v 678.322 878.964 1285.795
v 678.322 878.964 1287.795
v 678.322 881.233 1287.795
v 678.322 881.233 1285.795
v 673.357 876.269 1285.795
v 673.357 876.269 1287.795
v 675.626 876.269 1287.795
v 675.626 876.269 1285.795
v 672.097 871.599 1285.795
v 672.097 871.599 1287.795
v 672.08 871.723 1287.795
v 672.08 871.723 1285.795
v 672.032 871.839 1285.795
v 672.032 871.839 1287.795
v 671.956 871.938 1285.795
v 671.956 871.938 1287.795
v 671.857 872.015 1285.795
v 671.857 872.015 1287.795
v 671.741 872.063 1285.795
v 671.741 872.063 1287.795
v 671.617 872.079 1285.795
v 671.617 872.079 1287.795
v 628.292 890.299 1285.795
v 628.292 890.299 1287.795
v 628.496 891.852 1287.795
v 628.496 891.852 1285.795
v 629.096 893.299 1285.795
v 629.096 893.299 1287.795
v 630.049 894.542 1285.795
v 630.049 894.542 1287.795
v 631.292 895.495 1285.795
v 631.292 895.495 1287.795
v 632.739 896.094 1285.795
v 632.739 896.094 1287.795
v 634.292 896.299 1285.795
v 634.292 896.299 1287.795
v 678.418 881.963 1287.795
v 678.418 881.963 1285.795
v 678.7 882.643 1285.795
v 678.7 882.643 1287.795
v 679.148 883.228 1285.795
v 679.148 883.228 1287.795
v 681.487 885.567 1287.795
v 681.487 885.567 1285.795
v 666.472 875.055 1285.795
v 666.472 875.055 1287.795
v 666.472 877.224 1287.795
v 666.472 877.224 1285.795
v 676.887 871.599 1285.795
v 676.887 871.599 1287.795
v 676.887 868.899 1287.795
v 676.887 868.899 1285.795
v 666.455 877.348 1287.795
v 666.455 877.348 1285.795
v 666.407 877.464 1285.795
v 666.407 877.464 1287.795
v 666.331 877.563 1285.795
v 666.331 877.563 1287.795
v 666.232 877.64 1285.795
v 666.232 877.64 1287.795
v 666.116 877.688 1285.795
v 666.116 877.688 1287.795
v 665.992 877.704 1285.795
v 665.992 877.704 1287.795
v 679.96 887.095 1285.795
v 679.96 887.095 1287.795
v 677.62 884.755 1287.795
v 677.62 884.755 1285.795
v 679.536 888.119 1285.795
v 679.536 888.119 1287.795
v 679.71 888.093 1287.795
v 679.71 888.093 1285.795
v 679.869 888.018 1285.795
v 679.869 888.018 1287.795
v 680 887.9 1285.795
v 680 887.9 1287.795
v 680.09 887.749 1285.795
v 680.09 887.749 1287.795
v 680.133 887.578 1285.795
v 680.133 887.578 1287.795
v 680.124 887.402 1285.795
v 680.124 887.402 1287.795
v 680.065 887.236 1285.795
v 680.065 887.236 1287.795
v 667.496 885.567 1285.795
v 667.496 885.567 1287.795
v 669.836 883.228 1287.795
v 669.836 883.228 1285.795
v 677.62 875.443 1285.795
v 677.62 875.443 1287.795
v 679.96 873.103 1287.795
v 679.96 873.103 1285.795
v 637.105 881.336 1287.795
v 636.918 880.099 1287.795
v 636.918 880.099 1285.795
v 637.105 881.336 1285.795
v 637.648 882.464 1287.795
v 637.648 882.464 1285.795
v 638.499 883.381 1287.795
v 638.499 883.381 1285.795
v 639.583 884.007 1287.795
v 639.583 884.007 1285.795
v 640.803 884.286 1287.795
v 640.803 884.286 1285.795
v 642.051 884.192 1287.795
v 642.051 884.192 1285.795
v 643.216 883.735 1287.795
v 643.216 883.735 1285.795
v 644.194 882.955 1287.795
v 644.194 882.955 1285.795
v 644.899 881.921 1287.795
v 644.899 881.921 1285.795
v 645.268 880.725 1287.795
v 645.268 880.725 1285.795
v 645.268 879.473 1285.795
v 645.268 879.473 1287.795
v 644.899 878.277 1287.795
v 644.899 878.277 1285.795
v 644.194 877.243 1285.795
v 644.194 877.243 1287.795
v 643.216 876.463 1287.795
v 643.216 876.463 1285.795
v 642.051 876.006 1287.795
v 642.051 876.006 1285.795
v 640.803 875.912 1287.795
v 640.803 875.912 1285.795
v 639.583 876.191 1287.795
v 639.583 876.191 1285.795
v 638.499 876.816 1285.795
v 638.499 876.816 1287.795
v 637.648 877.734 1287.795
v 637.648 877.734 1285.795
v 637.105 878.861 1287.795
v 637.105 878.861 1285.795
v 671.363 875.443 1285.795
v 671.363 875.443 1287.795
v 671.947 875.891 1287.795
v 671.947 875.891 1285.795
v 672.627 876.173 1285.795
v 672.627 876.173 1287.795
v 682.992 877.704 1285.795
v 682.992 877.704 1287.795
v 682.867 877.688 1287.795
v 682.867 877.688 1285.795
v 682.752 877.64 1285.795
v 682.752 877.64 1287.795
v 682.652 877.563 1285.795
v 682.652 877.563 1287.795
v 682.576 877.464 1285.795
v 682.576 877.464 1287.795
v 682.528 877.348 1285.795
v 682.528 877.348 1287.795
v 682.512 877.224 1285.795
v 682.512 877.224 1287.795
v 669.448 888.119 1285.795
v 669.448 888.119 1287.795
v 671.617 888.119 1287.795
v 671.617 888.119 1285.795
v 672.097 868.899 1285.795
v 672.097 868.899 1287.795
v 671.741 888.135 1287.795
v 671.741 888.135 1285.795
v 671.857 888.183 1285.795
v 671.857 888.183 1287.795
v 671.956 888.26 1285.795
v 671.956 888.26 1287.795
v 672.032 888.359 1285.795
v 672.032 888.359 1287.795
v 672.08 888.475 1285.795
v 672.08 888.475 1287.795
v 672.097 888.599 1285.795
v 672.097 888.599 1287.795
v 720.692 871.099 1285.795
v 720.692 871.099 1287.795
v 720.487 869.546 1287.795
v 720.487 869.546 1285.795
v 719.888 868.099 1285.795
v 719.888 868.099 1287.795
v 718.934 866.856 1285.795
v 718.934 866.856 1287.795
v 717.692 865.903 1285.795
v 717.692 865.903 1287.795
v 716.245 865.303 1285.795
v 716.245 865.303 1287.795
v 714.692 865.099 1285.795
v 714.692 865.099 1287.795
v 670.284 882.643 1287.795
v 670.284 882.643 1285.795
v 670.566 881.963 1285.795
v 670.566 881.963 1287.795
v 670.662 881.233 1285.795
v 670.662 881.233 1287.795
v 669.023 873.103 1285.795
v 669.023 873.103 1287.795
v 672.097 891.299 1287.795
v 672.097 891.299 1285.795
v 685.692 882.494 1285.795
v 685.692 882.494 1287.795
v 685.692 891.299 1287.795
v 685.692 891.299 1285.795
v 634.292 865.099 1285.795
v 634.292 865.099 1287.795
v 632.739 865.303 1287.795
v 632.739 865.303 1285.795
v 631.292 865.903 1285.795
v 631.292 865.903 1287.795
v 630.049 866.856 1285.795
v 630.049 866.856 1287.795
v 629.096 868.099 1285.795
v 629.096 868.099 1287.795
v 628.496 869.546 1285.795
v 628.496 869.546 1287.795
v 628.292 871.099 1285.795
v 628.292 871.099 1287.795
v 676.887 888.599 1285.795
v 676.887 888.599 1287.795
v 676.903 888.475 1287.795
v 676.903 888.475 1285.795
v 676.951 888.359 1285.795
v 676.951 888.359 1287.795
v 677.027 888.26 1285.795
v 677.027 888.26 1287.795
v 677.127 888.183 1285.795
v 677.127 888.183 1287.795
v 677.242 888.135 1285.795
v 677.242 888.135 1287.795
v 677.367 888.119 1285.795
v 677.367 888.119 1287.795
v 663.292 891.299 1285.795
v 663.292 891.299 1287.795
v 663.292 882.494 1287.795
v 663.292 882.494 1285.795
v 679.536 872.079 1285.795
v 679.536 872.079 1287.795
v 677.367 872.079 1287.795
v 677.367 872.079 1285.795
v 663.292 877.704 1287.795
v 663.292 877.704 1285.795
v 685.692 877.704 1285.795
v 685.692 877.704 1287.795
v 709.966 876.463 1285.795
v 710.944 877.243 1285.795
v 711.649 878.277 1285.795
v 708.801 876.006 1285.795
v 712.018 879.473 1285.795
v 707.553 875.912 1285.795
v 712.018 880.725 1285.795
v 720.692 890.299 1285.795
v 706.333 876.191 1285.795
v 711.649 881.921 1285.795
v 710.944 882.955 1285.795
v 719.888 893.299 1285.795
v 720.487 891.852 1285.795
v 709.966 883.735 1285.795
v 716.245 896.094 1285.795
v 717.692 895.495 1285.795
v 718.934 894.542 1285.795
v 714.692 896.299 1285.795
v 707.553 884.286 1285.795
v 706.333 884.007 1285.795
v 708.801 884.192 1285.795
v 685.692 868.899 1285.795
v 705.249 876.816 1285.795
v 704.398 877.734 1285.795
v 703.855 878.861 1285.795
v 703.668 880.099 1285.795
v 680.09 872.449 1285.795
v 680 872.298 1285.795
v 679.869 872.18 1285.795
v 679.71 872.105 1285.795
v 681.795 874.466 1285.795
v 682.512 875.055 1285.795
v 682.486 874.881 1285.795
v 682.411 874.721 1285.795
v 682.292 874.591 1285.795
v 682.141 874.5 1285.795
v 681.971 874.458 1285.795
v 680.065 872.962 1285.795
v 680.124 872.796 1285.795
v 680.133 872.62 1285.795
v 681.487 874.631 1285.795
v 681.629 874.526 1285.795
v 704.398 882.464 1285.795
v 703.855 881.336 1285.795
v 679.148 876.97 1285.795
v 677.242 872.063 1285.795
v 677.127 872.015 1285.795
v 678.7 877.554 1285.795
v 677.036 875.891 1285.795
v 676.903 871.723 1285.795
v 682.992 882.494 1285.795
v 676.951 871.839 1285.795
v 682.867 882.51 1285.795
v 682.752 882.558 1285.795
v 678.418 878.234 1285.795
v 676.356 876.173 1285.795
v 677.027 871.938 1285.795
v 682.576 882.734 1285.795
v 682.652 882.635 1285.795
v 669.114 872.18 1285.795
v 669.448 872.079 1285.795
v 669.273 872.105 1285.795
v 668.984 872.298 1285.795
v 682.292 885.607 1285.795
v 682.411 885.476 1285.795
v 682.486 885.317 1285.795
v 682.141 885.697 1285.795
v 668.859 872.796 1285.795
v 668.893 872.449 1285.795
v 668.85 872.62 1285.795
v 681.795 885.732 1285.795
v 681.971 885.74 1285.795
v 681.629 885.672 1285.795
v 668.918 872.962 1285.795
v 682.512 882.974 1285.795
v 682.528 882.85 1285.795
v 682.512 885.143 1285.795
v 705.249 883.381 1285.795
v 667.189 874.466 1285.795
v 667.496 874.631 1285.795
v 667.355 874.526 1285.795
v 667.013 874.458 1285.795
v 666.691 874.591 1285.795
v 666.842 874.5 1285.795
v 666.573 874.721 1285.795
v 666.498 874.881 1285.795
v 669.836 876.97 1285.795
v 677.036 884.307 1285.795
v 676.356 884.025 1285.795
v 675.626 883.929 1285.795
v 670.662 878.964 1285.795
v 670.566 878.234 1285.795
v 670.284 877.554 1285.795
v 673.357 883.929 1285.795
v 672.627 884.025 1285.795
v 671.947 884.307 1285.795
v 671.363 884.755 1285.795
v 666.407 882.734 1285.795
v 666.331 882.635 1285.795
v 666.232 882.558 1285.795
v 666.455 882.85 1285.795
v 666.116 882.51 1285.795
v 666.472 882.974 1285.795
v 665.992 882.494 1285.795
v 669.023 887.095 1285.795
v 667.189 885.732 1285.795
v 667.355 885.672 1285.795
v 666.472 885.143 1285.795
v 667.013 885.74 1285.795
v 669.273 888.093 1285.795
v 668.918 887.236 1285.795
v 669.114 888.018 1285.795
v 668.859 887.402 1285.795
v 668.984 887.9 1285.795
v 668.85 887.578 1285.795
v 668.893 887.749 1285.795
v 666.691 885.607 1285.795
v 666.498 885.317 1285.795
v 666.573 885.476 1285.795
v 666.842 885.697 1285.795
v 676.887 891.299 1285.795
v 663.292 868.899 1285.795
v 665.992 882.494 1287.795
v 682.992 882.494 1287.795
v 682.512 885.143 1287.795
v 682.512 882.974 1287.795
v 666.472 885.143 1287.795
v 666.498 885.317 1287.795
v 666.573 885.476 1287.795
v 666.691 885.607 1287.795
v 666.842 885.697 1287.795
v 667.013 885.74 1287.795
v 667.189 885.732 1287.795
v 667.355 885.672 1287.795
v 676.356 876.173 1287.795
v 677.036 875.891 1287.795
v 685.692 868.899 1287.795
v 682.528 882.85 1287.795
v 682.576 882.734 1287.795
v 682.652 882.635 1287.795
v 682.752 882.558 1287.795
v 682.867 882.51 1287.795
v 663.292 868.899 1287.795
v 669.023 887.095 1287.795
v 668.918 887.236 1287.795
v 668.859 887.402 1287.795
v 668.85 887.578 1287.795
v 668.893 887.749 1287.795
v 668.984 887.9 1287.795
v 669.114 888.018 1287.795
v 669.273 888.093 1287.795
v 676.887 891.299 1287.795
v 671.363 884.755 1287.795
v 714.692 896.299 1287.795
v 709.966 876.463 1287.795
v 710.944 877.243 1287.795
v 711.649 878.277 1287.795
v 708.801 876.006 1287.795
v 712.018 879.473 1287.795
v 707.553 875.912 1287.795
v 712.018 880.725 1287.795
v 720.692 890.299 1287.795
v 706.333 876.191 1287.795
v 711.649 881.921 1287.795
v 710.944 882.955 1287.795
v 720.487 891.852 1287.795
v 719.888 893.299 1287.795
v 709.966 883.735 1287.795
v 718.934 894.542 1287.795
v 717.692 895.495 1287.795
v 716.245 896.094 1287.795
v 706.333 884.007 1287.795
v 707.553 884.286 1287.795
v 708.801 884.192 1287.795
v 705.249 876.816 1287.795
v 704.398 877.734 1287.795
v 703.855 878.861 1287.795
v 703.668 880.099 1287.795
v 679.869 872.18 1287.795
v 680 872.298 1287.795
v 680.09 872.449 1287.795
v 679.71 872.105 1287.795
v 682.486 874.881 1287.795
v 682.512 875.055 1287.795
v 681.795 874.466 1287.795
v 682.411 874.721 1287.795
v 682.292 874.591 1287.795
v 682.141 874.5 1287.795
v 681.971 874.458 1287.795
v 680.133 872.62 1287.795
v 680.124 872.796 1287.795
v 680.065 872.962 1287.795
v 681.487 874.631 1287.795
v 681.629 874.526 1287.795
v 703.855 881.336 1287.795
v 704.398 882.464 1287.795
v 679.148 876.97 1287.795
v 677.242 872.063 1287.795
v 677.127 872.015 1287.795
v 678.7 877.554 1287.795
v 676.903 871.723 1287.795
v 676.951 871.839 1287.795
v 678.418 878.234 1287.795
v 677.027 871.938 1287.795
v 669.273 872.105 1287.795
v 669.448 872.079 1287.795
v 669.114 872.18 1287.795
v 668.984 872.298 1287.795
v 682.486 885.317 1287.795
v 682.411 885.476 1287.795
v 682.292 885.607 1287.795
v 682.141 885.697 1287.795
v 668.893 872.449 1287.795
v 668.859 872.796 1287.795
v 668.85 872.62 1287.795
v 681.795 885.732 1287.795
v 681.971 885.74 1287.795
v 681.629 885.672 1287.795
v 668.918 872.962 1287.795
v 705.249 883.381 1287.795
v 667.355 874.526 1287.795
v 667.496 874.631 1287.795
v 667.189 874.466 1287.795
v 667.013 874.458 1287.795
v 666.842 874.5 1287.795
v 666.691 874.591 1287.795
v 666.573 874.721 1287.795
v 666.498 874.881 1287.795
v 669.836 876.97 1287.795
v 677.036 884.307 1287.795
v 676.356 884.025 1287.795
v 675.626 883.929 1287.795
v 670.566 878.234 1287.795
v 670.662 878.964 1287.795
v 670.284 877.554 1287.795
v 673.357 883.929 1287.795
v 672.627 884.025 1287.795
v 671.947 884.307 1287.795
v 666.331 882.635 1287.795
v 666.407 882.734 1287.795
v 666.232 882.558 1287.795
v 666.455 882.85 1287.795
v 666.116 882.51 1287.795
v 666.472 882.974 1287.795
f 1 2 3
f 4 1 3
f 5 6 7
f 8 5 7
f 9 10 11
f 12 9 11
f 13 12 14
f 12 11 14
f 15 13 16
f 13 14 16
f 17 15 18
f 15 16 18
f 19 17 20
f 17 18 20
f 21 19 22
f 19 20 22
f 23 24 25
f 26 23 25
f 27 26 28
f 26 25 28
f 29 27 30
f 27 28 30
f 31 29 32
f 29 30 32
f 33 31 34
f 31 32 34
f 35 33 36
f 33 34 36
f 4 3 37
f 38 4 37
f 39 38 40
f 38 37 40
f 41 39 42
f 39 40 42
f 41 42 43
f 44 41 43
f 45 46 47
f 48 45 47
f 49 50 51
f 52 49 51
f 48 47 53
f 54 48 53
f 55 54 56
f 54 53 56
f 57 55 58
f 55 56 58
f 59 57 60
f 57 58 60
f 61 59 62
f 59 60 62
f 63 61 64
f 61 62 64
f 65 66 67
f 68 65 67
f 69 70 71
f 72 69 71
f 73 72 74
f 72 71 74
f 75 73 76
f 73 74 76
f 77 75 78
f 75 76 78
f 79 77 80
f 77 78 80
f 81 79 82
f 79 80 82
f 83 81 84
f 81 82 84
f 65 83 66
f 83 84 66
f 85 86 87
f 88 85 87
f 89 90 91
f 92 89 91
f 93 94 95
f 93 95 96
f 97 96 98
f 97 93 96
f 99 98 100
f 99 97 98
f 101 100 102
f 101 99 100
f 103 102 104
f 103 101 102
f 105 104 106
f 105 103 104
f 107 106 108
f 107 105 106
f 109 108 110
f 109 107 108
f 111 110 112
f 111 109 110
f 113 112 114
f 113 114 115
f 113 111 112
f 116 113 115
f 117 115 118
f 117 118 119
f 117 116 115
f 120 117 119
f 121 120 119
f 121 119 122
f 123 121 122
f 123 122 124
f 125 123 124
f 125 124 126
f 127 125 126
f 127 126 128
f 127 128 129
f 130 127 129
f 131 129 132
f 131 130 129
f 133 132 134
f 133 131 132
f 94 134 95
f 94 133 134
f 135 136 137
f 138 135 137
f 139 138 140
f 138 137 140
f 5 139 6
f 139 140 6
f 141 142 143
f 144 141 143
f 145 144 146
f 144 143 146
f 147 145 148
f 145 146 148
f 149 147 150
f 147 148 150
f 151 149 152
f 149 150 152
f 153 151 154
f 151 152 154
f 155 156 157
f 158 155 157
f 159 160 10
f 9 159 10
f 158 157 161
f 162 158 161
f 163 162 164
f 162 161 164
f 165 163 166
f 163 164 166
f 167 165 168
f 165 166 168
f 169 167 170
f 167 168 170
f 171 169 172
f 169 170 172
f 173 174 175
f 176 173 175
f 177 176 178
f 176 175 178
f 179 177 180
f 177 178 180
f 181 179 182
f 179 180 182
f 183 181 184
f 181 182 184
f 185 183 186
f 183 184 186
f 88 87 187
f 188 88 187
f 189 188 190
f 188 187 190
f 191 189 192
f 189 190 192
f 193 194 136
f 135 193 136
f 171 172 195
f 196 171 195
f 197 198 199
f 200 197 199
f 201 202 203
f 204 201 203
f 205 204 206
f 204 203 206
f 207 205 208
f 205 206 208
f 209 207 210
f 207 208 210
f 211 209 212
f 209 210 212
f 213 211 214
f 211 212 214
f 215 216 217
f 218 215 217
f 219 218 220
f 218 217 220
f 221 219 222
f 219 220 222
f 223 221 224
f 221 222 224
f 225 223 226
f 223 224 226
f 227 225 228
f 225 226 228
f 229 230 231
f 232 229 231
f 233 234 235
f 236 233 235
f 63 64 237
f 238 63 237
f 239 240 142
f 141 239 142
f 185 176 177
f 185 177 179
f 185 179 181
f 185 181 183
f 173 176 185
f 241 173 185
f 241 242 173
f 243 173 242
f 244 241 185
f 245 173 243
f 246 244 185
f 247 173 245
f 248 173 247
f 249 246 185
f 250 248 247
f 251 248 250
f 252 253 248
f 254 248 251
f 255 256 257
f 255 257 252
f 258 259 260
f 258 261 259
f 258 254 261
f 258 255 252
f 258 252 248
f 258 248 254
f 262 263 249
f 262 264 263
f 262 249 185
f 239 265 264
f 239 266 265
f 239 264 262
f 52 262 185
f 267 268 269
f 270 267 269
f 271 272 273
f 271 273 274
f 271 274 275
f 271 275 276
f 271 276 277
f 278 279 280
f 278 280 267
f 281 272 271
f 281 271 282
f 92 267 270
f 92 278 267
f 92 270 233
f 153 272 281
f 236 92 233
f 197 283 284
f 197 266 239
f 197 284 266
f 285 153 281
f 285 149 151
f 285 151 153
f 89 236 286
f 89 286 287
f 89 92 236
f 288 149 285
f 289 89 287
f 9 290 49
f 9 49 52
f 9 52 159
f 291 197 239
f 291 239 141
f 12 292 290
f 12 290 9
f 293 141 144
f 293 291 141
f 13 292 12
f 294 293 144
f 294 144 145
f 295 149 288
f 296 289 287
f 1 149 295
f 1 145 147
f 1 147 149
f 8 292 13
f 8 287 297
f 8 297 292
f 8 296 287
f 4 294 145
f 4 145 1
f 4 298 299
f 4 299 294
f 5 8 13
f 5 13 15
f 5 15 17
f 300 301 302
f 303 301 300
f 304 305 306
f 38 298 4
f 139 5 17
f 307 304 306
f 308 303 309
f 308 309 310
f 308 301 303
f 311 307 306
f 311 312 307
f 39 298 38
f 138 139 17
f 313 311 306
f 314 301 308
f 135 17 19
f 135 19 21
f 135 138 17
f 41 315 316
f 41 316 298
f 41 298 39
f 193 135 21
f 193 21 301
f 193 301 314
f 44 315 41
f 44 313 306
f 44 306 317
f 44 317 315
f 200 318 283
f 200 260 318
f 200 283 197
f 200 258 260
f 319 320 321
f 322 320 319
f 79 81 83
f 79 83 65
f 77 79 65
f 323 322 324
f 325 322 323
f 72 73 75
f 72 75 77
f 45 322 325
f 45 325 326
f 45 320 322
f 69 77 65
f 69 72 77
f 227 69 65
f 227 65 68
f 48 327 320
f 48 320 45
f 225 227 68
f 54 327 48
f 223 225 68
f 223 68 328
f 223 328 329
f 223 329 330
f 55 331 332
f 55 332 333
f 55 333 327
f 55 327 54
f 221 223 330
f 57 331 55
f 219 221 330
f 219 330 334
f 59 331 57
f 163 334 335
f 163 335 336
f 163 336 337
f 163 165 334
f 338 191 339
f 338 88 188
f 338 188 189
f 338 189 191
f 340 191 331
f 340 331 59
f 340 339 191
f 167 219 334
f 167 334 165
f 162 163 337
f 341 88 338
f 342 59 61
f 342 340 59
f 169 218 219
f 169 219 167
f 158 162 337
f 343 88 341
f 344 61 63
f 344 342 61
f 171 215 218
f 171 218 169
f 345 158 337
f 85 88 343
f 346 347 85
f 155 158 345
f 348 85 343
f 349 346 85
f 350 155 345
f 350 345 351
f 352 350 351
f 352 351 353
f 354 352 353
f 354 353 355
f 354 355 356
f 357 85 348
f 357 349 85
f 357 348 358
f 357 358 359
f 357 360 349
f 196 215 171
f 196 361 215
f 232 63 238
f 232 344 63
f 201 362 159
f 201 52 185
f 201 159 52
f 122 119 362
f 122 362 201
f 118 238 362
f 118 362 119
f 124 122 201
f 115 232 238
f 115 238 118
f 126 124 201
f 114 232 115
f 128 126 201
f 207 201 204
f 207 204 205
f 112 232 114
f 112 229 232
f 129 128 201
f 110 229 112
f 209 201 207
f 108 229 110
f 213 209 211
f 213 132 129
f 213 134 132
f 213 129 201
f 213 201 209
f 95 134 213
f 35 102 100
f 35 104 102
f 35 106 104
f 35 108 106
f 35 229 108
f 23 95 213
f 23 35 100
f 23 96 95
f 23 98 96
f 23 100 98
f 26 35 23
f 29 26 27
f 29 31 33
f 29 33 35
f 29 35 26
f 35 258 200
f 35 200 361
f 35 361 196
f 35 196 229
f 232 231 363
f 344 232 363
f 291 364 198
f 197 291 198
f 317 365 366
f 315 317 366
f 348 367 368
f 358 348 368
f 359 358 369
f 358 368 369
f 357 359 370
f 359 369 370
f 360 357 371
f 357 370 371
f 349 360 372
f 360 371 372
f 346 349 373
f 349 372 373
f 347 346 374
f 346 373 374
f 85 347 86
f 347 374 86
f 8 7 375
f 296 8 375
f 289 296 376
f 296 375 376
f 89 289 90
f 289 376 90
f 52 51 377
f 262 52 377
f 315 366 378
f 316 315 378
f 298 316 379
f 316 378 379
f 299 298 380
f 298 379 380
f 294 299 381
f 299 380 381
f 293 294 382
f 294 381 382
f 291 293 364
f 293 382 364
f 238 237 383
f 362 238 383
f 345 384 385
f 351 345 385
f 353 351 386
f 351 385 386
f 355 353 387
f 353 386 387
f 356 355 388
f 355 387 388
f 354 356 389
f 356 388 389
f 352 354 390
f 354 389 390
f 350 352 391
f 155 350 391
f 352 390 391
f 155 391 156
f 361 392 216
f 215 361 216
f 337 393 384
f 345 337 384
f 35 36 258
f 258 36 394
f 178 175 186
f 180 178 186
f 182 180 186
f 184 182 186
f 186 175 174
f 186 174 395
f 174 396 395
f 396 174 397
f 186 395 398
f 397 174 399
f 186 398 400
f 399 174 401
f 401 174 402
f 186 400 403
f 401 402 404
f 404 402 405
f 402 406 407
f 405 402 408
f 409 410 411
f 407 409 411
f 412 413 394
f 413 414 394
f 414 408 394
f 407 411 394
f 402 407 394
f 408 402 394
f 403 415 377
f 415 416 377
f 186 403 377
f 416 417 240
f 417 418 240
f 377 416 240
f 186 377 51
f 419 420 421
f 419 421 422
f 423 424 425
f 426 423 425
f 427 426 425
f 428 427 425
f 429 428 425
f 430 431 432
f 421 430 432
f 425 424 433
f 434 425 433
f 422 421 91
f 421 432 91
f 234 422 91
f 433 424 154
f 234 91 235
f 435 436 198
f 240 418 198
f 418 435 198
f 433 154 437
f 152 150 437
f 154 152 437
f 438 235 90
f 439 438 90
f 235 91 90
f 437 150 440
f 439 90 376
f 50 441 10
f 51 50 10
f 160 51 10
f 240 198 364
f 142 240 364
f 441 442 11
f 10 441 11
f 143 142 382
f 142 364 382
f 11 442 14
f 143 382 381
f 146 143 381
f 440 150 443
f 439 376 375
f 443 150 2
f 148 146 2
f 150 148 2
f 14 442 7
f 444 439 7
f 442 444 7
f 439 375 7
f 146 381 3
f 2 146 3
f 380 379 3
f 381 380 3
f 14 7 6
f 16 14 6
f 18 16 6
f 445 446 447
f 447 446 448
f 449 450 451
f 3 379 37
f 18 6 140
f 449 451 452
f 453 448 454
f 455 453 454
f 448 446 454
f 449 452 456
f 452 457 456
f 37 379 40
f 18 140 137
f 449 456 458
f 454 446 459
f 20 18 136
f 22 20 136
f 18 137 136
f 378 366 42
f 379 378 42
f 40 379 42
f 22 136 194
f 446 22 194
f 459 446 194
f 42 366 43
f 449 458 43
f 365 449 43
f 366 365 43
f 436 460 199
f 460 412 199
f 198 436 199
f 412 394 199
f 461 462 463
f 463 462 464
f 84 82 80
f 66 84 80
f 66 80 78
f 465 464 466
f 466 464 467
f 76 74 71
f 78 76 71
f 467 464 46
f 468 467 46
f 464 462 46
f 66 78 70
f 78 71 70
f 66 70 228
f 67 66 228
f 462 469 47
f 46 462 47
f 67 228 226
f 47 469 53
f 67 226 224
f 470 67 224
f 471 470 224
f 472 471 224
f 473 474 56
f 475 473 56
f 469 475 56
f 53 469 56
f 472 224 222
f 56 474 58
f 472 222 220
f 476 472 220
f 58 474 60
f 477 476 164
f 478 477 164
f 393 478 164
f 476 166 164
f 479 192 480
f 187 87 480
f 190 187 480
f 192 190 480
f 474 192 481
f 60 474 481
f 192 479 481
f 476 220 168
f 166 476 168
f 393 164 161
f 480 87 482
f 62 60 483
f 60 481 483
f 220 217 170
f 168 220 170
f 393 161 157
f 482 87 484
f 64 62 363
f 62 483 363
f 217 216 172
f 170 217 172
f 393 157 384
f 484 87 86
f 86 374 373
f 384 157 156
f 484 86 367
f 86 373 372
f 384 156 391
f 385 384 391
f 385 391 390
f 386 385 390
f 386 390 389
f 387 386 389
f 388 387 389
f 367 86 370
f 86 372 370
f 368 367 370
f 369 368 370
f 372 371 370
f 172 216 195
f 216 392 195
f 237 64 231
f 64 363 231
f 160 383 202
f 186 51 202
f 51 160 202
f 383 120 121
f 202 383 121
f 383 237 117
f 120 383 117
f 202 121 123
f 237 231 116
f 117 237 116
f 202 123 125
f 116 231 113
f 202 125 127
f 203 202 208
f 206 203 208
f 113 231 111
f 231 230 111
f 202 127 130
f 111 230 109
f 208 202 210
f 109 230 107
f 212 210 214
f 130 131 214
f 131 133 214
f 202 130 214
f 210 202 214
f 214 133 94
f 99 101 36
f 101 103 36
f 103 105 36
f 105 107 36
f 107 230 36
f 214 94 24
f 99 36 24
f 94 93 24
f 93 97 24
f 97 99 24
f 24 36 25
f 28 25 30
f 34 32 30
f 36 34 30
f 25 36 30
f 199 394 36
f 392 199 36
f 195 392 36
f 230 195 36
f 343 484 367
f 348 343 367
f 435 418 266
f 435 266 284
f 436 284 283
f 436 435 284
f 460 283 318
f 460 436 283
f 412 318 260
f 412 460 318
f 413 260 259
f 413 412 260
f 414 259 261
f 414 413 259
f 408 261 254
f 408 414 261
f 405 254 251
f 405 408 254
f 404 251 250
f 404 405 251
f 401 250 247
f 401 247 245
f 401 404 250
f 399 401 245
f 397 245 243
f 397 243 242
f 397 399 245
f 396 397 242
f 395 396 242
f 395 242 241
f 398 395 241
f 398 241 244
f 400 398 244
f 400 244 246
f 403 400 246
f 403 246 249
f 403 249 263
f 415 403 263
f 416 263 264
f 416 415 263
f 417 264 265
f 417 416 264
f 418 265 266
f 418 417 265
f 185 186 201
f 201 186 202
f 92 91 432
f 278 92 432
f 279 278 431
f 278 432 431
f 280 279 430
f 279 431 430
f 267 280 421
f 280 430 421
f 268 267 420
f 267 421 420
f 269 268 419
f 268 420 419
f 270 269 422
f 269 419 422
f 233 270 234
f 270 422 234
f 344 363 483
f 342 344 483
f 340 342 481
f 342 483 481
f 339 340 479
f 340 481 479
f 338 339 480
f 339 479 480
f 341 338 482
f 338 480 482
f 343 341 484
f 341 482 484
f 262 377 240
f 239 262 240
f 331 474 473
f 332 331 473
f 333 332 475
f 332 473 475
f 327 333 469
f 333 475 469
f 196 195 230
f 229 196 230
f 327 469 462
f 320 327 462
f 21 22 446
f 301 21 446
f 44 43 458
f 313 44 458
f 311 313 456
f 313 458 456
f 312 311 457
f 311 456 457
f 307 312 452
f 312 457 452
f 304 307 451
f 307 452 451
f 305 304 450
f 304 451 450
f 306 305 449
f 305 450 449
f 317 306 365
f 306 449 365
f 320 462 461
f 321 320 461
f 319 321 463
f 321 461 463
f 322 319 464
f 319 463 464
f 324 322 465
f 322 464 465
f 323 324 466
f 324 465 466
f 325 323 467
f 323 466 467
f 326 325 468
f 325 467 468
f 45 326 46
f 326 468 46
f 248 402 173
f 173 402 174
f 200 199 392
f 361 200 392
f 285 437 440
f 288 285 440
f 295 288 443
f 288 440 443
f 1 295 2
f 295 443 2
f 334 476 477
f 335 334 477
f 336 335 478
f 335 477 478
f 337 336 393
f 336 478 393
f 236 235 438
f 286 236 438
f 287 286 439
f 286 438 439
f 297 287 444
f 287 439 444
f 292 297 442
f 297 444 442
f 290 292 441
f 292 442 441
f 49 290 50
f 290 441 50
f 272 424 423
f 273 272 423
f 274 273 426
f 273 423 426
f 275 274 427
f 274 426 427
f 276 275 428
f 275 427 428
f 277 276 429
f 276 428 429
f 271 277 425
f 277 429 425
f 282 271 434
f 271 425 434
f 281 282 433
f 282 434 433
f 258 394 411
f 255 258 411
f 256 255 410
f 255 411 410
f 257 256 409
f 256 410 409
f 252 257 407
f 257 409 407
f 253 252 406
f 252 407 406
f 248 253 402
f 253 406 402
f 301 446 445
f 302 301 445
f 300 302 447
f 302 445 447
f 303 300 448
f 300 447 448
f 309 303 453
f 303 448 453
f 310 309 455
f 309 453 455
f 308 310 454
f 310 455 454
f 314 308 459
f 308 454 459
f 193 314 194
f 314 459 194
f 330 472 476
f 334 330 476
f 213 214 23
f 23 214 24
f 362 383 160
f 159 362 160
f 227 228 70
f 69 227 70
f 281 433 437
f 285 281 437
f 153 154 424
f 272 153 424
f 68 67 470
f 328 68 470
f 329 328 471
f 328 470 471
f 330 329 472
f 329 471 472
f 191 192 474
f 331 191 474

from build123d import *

# Parameters (mm, degrees)
SKETCH1_R           = 4.198469776
BOSS_EXTRUDE1_DEPTH = 2


with BuildPart() as part:
    # Sketch1 → Boss-Extrude1 (new body)
    with BuildSketch(Plane(origin=(0, 0, 1287.795194646), x_dir=(-1, 0, 0), z_dir=(0, 0, -1))):
        with BuildLine():
            Line((-628.291713491, 871.098927157), (-628.291713491, 890.298927157))
            ThreePointArc((-628.291713491, 890.298927157), (-630.049072803, 894.541567844), (-634.291713491, 896.298927157))
            Line((-634.291713491, 896.298927157), (-714.691713491, 896.298927157))
            ThreePointArc((-714.691713491, 896.298927157), (-718.934354178, 894.541567844), (-720.691713491, 890.298927157))
            Line((-720.691713491, 890.298927157), (-720.691713491, 871.098927157))
            ThreePointArc((-720.691713491, 871.098927157), (-718.934354178, 866.85628647), (-714.691713491, 865.098927157))
            Line((-714.691713491, 865.098927157), (-634.291713491, 865.098927157))
            ThreePointArc((-634.291713491, 865.098927157), (-630.049072803, 866.85628647), (-628.291713491, 871.098927157))
        make_face()
        with Locations((-707.866713491, 880.098927157)):
            Circle(SKETCH1_R, mode=Mode.SUBTRACT)
        with Locations((-641.116713491, 880.098927157)):
            Circle(SKETCH1_R, mode=Mode.SUBTRACT)
        with BuildLine():
            Line((-682.991714253, 882.493927157), (-685.691713491, 882.493927157))
            Line((-685.691713491, 882.493927157), (-685.691713491, 891.298927157))
            Line((-685.691713491, 891.298927157), (-676.886713491, 891.298927157))
            Line((-676.886713491, 891.298927157), (-676.886713491, 888.59892792))
            ThreePointArc((-676.886713491, 888.59892792), (-677.027302174, 888.259516726), (-677.366713318, 888.11892792))
            Line((-677.366713318, 888.11892792), (-679.535834903, 888.118927139))
            ThreePointArc((-679.535834903, 888.118927139), (-680.090162448, 887.748537098), (-679.960098756, 887.09466307))
            Line((-679.960098756, 887.09466307), (-677.620321725, 884.754886039))
            ThreePointArc((-677.620321725, 884.754886039), (-676.705447884, 884.143586882), (-675.626280608, 883.928927162))
            Line((-675.626280608, 883.928927162), (-673.357146389, 883.928927157))
            ThreePointArc((-673.357146389, 883.928927157), (-672.277979107, 884.143586875), (-671.363105261, 884.754886034))
            Line((-671.363105261, 884.754886034), (-669.023328231, 887.094663064))
            ThreePointArc((-669.023328231, 887.094663064), (-668.893264539, 887.748537091), (-669.447592082, 888.118927133))
            Line((-669.447592082, 888.118927133), (-671.616713665, 888.11892792))
            ThreePointArc((-671.616713665, 888.11892792), (-671.956124807, 888.259516727), (-672.096713491, 888.59892792))
            Line((-672.096713491, 888.59892792), (-672.096713491, 891.298927157))
            Line((-672.096713491, 891.298927157), (-663.291713491, 891.298927157))
            Line((-663.291713491, 891.298927157), (-663.291713491, 882.493927157))
            Line((-663.291713491, 882.493927157), (-665.991712728, 882.493927157))
            ThreePointArc((-665.991712728, 882.493927157), (-666.331123921, 882.634515841), (-666.471712728, 882.973926984))
            Line((-666.471712728, 882.973926984), (-666.471713509, 885.14304857))
            ThreePointArc((-666.471713509, 885.14304857), (-666.84210355, 885.697376115), (-667.495977578, 885.567312423))
            Line((-667.495977578, 885.567312423), (-669.835754609, 883.227535392))
            ThreePointArc((-669.835754609, 883.227535392), (-670.447053766, 882.312661551), (-670.661713486, 881.233494275))
            Line((-670.661713486, 881.233494275), (-670.66171349, 878.964360056))
            ThreePointArc((-670.66171349, 878.964360056), (-670.447053773, 877.885192774), (-669.835754613, 876.970318927))
            Line((-669.835754613, 876.970318927), (-667.495977584, 874.630541898))
            ThreePointArc((-667.495977584, 874.630541898), (-666.842103556, 874.500478205), (-666.471713515, 875.054805749))
            Line((-666.471713515, 875.054805749), (-666.471712728, 877.223927331))
            ThreePointArc((-666.471712728, 877.223927331), (-666.331123921, 877.563338474), (-665.991712728, 877.703927157))
            Line((-665.991712728, 877.703927157), (-663.291713491, 877.703927157))
            Line((-663.291713491, 877.703927157), (-663.291713491, 868.898927157))
            Line((-663.291713491, 868.898927157), (-672.096713491, 868.898927157))
            Line((-672.096713491, 868.898927157), (-672.096713491, 871.598926394))
            ThreePointArc((-672.096713491, 871.598926394), (-671.956124807, 871.938337588), (-671.616713663, 872.078926394))
            Line((-671.616713663, 872.078926394), (-669.447592078, 872.078927176))
            ThreePointArc((-669.447592078, 872.078927176), (-668.893264533, 872.449317216), (-669.023328225, 873.103191245))
            Line((-669.023328225, 873.103191245), (-671.363105256, 875.442968275))
            ThreePointArc((-671.363105256, 875.442968275), (-672.277979097, 876.054267433), (-673.357146373, 876.268927152))
            Line((-673.357146373, 876.268927152), (-675.626280592, 876.268927157))
            ThreePointArc((-675.626280592, 876.268927157), (-676.705447874, 876.05426744), (-677.62032172, 875.44296828))
            Line((-677.62032172, 875.44296828), (-679.96009875, 873.103191251))
            ThreePointArc((-679.96009875, 873.103191251), (-680.090162442, 872.449317223), (-679.535834899, 872.078927182))
            Line((-679.535834899, 872.078927182), (-677.366713316, 872.078926394))
            ThreePointArc((-677.366713316, 872.078926394), (-677.027302174, 871.938337588), (-676.886713491, 871.598926394))
            Line((-676.886713491, 871.598926394), (-676.886713491, 868.898927157))
            Line((-676.886713491, 868.898927157), (-685.691713491, 868.898927157))
            Line((-685.691713491, 868.898927157), (-685.691713491, 877.703927157))
            Line((-685.691713491, 877.703927157), (-682.991714253, 877.703927157))
            ThreePointArc((-682.991714253, 877.703927157), (-682.65230306, 877.563338473), (-682.511714253, 877.22392733))
            Line((-682.511714253, 877.22392733), (-682.511713472, 875.054805744))
            ThreePointArc((-682.511713472, 875.054805744), (-682.141323432, 874.5004782), (-681.487449403, 874.630541892))
            Line((-681.487449403, 874.630541892), (-679.147672372, 876.970318923))
            ThreePointArc((-679.147672372, 876.970318923), (-678.536373215, 877.885192764), (-678.321713495, 878.96436004))
            Line((-678.321713495, 878.96436004), (-678.321713491, 881.233494258))
            ThreePointArc((-678.321713491, 881.233494258), (-678.536373208, 882.312661541), (-679.147672368, 883.227535387))
            Line((-679.147672368, 883.227535387), (-681.487449397, 885.567312417))
            ThreePointArc((-681.487449397, 885.567312417), (-682.141323425, 885.697376109), (-682.511713466, 885.143048566))
            Line((-682.511713466, 885.143048566), (-682.511714253, 882.973926983))
            ThreePointArc((-682.511714253, 882.973926983), (-682.65230306, 882.634515841), (-682.991714253, 882.493927157))
        make_face(mode=Mode.SUBTRACT)
    extrude(amount=BOSS_EXTRUDE1_DEPTH)


solid = part.part
